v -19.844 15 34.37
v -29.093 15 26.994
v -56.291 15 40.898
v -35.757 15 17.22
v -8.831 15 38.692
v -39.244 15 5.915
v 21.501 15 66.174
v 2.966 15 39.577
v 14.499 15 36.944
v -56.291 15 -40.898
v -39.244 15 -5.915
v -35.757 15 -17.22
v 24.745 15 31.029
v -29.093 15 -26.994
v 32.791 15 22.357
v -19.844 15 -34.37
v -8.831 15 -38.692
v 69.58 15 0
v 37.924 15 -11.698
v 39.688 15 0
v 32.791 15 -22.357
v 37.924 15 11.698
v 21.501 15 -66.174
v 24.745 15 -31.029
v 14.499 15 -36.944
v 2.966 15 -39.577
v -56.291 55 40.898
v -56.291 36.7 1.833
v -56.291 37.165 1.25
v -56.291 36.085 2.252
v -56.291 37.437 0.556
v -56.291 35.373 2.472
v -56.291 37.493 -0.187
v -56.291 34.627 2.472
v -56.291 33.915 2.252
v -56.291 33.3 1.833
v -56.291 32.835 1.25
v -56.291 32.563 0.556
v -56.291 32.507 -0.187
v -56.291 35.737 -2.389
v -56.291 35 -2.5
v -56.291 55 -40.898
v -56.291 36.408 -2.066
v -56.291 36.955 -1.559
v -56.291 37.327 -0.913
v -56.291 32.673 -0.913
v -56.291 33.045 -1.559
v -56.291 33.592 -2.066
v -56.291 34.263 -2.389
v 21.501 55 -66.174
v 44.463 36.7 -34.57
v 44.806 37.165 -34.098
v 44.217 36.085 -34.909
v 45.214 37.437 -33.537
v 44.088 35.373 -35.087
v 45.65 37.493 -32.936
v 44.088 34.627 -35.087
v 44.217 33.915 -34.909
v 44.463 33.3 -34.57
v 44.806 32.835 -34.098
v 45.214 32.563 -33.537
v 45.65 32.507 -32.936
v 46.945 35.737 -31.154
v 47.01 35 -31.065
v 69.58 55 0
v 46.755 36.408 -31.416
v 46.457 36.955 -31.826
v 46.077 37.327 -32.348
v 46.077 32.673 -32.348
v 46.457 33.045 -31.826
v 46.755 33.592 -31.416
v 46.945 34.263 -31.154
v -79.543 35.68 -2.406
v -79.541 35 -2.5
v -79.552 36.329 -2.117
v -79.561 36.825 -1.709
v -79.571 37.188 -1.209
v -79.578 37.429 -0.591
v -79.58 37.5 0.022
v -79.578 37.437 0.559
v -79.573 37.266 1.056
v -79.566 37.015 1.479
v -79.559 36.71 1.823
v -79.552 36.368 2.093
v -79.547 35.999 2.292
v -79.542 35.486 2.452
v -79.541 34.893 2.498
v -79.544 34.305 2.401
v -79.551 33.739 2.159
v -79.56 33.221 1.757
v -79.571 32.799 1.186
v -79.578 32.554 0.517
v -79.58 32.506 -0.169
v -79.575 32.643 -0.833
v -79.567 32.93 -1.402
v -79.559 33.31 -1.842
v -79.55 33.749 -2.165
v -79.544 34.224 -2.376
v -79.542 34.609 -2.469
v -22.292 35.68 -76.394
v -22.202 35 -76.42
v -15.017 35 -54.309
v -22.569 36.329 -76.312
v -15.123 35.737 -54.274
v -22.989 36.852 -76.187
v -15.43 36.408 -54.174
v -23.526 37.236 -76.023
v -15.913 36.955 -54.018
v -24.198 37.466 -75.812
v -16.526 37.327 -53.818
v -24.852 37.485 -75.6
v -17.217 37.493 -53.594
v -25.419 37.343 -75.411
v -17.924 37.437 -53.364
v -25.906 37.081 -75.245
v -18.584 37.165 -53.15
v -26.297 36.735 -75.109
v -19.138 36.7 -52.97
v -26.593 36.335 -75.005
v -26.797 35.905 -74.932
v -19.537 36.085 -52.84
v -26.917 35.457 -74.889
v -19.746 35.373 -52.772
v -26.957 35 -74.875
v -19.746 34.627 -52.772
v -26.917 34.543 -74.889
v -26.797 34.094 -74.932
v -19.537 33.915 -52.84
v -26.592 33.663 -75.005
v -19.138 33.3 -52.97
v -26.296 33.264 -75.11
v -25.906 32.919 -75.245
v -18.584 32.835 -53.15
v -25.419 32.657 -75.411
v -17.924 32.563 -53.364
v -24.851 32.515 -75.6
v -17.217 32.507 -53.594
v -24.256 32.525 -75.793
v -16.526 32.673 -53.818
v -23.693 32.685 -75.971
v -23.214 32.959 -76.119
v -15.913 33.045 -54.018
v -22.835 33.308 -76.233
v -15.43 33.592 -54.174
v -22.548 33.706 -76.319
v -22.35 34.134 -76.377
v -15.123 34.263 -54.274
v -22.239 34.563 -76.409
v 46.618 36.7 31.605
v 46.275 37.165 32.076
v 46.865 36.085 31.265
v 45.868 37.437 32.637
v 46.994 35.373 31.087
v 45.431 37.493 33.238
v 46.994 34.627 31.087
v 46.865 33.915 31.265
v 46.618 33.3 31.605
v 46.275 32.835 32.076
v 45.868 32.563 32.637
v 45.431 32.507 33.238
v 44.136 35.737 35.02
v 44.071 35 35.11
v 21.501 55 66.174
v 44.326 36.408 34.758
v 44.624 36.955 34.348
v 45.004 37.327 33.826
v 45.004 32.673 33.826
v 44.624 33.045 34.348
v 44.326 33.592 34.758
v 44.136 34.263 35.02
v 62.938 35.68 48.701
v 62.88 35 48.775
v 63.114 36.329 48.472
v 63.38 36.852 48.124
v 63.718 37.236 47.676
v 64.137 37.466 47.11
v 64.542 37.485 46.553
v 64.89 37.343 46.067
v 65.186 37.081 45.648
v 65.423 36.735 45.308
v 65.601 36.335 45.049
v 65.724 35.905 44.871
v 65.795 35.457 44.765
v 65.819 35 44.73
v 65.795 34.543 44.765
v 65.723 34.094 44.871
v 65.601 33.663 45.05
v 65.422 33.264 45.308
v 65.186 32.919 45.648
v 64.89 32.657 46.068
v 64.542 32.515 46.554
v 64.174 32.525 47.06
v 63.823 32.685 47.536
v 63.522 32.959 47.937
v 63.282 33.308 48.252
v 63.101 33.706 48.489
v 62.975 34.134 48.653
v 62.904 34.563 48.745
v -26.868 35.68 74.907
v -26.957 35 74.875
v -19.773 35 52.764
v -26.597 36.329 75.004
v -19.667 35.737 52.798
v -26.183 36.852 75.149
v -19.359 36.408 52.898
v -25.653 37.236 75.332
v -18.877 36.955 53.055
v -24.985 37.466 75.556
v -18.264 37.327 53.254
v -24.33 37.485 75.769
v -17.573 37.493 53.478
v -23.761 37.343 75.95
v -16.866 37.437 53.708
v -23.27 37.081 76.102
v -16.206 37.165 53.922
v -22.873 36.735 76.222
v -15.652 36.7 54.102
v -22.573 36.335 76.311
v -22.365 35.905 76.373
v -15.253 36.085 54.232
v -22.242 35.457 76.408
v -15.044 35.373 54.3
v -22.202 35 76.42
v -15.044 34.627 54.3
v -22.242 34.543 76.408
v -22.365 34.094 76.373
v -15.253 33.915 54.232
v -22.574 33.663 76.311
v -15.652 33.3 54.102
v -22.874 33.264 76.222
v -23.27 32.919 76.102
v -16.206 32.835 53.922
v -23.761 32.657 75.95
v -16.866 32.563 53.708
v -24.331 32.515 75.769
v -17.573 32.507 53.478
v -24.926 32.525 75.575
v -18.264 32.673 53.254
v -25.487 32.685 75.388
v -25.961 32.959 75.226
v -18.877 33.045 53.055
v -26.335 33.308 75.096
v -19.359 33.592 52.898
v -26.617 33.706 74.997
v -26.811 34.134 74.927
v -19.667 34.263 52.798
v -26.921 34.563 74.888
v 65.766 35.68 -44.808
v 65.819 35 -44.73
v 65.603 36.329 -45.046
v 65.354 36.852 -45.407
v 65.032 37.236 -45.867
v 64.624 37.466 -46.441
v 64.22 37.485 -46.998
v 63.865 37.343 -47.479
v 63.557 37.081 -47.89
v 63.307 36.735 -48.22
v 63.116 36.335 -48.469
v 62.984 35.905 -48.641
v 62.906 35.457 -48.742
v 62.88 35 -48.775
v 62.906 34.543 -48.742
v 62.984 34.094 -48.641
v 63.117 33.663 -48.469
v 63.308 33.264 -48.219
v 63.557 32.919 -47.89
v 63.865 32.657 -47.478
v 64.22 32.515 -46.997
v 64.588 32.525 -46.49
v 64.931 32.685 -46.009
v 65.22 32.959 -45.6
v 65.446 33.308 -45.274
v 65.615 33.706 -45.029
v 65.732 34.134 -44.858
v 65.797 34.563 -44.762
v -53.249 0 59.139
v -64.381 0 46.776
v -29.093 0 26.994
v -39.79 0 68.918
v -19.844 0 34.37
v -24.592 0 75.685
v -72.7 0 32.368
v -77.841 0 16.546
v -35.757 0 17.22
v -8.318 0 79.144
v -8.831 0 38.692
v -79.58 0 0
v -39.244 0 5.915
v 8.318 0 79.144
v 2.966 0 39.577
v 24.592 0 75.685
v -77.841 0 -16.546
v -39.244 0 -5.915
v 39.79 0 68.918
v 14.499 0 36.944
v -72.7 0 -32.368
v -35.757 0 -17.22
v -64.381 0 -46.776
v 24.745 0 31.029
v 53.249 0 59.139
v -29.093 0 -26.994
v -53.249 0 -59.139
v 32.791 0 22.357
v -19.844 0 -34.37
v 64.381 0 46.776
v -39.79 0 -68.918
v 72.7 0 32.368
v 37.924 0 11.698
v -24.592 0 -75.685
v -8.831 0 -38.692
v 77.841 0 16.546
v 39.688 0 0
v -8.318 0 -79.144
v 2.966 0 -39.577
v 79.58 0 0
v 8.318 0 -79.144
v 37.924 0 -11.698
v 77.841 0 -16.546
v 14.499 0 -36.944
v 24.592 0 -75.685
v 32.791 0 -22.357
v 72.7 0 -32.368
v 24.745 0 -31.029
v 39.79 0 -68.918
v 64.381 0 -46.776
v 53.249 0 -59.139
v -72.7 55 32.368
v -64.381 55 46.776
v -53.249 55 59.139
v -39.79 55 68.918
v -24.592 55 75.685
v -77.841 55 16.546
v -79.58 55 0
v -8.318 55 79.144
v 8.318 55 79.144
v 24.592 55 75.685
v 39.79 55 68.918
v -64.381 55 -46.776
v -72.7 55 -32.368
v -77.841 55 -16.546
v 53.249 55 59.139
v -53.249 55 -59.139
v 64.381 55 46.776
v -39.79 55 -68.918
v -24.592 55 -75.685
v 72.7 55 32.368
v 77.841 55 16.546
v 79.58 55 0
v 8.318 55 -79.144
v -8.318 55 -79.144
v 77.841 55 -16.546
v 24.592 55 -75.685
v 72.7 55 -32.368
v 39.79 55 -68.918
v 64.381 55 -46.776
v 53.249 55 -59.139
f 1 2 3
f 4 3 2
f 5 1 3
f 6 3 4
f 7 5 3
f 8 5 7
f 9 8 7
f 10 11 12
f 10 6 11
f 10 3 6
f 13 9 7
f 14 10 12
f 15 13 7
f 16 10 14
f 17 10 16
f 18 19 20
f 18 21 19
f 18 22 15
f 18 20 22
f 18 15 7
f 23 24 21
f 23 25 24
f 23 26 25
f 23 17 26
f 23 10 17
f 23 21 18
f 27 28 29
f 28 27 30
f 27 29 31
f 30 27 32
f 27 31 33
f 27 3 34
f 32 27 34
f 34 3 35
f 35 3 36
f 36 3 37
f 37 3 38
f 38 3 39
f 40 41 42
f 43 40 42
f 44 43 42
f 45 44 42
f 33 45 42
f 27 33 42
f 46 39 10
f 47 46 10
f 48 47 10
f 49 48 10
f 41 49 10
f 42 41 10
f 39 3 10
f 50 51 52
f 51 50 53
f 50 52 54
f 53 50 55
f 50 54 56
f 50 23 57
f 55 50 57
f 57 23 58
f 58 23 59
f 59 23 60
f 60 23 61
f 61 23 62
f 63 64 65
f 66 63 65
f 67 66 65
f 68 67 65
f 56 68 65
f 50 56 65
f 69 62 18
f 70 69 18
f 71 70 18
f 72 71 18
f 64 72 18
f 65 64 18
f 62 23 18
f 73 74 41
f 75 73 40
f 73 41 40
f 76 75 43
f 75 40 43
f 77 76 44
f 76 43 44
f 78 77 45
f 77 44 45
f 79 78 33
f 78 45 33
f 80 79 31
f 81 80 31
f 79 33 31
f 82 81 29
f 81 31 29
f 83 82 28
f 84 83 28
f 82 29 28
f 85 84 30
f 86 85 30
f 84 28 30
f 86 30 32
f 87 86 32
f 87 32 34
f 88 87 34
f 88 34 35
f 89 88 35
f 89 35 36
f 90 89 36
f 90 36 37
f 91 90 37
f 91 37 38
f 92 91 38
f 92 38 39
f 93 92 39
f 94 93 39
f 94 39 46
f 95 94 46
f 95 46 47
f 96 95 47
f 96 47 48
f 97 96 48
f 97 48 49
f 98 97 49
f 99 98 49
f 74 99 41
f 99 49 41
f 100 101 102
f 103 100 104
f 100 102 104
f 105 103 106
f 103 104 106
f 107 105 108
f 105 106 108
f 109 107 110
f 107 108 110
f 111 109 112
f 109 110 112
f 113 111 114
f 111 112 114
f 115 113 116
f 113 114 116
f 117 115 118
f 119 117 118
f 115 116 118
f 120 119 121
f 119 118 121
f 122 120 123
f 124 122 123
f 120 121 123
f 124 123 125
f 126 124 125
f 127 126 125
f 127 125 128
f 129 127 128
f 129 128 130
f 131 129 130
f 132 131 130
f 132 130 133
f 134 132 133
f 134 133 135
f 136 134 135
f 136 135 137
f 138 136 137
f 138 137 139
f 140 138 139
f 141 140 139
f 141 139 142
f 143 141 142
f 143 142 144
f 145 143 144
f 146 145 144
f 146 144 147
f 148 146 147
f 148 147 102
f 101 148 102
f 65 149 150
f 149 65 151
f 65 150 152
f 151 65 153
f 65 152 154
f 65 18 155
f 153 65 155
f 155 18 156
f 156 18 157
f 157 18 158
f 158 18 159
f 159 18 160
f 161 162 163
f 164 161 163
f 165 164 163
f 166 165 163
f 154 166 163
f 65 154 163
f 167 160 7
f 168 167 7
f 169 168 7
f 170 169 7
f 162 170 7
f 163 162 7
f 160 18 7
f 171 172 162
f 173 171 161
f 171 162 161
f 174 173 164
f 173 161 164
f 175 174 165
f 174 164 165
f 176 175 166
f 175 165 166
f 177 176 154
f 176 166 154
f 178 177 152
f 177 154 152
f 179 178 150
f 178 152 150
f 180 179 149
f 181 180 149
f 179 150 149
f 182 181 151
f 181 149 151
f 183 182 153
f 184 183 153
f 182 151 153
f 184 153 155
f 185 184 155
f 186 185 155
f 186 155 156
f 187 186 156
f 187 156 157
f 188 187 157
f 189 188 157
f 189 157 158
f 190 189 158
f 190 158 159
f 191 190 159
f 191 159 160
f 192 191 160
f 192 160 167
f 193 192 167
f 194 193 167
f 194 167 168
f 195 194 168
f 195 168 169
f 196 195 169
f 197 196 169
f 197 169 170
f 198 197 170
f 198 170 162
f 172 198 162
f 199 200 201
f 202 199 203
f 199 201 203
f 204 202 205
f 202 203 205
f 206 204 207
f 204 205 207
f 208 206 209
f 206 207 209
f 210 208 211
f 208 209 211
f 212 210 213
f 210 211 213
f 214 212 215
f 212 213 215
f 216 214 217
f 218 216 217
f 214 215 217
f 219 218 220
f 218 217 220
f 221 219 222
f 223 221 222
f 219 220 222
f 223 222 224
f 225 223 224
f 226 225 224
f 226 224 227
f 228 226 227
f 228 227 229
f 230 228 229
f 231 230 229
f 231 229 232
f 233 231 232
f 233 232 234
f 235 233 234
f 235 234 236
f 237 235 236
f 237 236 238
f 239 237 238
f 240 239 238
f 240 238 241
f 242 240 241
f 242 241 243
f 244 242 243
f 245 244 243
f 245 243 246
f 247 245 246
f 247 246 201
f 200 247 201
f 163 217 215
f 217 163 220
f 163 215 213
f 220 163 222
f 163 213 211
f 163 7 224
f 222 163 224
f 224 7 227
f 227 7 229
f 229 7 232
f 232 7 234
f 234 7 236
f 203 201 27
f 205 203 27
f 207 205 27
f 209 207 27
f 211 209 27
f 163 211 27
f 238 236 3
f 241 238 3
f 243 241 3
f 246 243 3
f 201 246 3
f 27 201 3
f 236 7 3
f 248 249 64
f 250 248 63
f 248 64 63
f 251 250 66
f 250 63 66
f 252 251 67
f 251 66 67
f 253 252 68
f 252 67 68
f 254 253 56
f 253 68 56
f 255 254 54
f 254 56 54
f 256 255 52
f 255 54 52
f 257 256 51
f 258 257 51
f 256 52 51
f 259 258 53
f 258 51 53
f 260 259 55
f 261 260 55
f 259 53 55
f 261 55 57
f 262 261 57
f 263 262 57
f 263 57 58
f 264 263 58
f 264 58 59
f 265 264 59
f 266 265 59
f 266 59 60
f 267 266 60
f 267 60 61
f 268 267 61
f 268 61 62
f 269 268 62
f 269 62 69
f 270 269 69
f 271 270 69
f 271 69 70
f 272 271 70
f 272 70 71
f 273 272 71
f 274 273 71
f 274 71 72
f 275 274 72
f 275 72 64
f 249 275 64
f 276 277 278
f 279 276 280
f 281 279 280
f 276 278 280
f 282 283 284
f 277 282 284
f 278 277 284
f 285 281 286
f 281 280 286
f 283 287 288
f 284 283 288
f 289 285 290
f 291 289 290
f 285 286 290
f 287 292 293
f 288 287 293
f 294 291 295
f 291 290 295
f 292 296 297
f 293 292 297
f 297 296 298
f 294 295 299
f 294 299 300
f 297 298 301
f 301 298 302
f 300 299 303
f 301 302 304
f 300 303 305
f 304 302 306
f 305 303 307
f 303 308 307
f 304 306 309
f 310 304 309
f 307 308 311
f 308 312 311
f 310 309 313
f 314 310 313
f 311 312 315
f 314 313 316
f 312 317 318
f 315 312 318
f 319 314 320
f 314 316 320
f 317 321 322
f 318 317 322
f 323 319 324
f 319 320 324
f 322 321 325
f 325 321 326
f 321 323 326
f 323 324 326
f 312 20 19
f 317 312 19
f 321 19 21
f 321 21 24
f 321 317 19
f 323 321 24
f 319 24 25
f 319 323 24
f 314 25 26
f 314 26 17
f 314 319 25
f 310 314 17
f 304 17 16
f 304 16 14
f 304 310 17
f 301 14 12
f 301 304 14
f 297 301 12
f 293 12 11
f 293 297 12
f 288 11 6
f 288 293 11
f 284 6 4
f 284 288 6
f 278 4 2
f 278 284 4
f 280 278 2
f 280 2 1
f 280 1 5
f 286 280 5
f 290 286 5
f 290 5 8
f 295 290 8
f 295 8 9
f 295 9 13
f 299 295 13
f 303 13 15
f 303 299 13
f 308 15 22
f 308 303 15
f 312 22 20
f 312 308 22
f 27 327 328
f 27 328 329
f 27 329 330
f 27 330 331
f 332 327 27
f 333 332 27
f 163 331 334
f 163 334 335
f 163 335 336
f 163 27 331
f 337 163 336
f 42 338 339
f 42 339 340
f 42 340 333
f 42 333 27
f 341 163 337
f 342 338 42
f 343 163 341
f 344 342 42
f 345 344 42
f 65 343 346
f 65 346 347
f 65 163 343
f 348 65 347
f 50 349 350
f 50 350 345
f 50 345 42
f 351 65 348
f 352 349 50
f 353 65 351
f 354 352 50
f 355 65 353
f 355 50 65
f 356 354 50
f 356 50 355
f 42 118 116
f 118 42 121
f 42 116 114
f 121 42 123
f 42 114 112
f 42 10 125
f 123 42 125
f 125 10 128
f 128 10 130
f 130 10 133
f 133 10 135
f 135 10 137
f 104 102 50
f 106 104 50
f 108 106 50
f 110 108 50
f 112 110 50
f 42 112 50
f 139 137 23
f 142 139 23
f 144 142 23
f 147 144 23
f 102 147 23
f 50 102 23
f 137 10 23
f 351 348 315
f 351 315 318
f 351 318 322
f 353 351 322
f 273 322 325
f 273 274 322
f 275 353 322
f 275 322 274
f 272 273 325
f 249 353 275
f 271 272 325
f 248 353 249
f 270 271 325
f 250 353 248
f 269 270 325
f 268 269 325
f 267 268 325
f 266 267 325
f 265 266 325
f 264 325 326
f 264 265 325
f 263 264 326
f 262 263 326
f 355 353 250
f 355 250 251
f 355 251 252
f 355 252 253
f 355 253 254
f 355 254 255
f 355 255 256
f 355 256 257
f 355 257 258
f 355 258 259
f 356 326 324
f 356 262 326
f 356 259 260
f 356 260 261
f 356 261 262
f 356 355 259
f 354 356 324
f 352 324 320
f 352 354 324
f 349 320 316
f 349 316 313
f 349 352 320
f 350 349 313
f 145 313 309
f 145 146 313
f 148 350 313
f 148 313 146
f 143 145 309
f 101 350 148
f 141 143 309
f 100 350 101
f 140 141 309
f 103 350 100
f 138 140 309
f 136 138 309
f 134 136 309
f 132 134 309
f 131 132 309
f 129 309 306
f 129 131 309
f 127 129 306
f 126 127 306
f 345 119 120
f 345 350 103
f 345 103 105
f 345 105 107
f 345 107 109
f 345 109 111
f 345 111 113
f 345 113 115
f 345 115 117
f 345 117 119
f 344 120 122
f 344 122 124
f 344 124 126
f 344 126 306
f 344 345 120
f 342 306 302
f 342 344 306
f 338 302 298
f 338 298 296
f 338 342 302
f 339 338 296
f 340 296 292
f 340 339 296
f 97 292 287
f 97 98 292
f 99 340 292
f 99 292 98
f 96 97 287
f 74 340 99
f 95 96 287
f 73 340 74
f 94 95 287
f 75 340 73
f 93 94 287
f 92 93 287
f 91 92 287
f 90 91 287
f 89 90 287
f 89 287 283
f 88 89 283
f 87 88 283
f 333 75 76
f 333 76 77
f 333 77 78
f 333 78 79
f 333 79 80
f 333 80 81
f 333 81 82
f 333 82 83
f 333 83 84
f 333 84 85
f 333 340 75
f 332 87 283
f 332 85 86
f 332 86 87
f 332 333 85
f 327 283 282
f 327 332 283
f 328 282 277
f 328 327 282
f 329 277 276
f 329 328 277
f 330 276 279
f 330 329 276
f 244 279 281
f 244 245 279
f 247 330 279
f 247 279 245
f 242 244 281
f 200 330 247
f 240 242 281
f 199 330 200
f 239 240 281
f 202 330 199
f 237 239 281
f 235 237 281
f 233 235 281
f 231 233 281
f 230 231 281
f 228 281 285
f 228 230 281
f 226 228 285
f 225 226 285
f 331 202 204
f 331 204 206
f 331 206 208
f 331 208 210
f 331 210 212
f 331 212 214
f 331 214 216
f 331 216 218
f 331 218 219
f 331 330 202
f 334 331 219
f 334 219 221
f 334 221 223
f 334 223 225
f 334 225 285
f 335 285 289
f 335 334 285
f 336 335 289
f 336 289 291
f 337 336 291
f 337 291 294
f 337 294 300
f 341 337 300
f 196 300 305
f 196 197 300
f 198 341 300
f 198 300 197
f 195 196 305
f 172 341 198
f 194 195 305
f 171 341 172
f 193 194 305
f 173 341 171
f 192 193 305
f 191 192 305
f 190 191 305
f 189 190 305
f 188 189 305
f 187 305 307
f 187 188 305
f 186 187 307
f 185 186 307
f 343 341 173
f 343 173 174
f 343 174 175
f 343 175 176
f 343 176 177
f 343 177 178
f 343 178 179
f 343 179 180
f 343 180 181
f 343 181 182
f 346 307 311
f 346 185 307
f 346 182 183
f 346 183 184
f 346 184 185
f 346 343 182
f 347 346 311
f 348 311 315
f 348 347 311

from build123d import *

# Parameters (mm, degrees)
SKETCH1_R                = 69.57983352
SKETCH1_R_2              = 39.6875
BOSS_EXTRUDE1_DEPTH      = 15
SKETCH2_R                = 79.57983352
SKETCH2_R_2              = 69.57983352
BOSS_EXTRUDE2_DEPTH      = 40
BOSS_EXTRUDE2_DEPTH_BACK = 15
BOSS_EXTRUDE3_DEPTH      = 40
SKETCH4_R                = 2.5
CUT_EXTRUDE1_DEPTH       = 44.985172419
CIRPATTERN1_COUNT        = 5


with BuildPart() as part:
    # Sketch1 → Boss-Extrude1 (new body)
    with BuildSketch(Plane(origin=(0, 0, 0), x_dir=(1, 0, 0), z_dir=(0, 1, 0))):
        Circle(SKETCH1_R)
        Circle(SKETCH1_R_2, mode=Mode.SUBTRACT)
    extrude(amount=BOSS_EXTRUDE1_DEPTH)

    # Sketch2 → Boss-Extrude2 (add, two sides)
    with BuildSketch(Plane(origin=(0, 15, 0), x_dir=(1, 0, 0), z_dir=(0, 1, 0))) as boss_extrude2_sk:
        Circle(SKETCH2_R)
        Circle(SKETCH2_R_2, mode=Mode.SUBTRACT)
    extrude(amount=BOSS_EXTRUDE2_DEPTH)
    extrude(boss_extrude2_sk.sketch, amount=-BOSS_EXTRUDE2_DEPTH_BACK)

    # Sketch3 → Boss-Extrude3 (add)
    with BuildSketch(Plane(origin=(0, 15, 0), x_dir=(1, 0, 0), z_dir=(0, 1, 0))):
        with BuildLine():
            ThreePointArc((21.501351023, -66.174354072), (56.291267783, -40.898), (69.57983352, 0))
            Line((69.57983352, 0), (21.501351023, -66.174354072))
        make_face()
        with BuildLine():
            Line((21.501351023, 66.174354072), (69.57983352, 0))
            ThreePointArc((69.57983352, 0), (56.291267783, 40.898), (21.501351023, 66.174354072))
        make_face()
        with BuildLine():
            Line((-56.291267783, 40.898), (21.501351023, 66.174354072))
            ThreePointArc((21.501351023, 66.174354072), (-21.501351023, 66.174354072), (-56.291267783, 40.898))
        make_face()
        with BuildLine():
            ThreePointArc((-56.291267783, -40.898), (-21.501351023, -66.174354072), (21.501351023, -66.174354072))
            Line((21.501351023, -66.174354072), (-56.291267783, -40.898))
        make_face()
        with BuildLine():
            Line((-56.291267783, -40.898), (-56.291267783, 40.898))
            ThreePointArc((-56.291267783, 40.898), (-69.57983352, 0), (-56.291267783, -40.898))
        make_face()
    extrude(amount=BOSS_EXTRUDE3_DEPTH)

    # Sketch4 → Cut-Extrude1 (cut, through all)
    with BuildSketch(Plane(origin=(-17.39495838, 0, -53.536177036), x_dir=(0.951056516, 0, -0.309016994), z_dir=(0.309016994, 0, 0.951056516))):
        with Locations((0, 35)):
            Circle(SKETCH4_R)
    cut_extrude1 = extrude(amount=-CUT_EXTRUDE1_DEPTH, mode=Mode.SUBTRACT)

    # CirPattern1: Cut-Extrude1 ×5 about axis
    cirpattern1_axis = Axis((0, -225.085759711, 0), (0, 1, 0))
    for i in range(1, CIRPATTERN1_COUNT):
        add(cut_extrude1.rotate(cirpattern1_axis, i * 360 / CIRPATTERN1_COUNT), mode=Mode.SUBTRACT)


solid = part.part
